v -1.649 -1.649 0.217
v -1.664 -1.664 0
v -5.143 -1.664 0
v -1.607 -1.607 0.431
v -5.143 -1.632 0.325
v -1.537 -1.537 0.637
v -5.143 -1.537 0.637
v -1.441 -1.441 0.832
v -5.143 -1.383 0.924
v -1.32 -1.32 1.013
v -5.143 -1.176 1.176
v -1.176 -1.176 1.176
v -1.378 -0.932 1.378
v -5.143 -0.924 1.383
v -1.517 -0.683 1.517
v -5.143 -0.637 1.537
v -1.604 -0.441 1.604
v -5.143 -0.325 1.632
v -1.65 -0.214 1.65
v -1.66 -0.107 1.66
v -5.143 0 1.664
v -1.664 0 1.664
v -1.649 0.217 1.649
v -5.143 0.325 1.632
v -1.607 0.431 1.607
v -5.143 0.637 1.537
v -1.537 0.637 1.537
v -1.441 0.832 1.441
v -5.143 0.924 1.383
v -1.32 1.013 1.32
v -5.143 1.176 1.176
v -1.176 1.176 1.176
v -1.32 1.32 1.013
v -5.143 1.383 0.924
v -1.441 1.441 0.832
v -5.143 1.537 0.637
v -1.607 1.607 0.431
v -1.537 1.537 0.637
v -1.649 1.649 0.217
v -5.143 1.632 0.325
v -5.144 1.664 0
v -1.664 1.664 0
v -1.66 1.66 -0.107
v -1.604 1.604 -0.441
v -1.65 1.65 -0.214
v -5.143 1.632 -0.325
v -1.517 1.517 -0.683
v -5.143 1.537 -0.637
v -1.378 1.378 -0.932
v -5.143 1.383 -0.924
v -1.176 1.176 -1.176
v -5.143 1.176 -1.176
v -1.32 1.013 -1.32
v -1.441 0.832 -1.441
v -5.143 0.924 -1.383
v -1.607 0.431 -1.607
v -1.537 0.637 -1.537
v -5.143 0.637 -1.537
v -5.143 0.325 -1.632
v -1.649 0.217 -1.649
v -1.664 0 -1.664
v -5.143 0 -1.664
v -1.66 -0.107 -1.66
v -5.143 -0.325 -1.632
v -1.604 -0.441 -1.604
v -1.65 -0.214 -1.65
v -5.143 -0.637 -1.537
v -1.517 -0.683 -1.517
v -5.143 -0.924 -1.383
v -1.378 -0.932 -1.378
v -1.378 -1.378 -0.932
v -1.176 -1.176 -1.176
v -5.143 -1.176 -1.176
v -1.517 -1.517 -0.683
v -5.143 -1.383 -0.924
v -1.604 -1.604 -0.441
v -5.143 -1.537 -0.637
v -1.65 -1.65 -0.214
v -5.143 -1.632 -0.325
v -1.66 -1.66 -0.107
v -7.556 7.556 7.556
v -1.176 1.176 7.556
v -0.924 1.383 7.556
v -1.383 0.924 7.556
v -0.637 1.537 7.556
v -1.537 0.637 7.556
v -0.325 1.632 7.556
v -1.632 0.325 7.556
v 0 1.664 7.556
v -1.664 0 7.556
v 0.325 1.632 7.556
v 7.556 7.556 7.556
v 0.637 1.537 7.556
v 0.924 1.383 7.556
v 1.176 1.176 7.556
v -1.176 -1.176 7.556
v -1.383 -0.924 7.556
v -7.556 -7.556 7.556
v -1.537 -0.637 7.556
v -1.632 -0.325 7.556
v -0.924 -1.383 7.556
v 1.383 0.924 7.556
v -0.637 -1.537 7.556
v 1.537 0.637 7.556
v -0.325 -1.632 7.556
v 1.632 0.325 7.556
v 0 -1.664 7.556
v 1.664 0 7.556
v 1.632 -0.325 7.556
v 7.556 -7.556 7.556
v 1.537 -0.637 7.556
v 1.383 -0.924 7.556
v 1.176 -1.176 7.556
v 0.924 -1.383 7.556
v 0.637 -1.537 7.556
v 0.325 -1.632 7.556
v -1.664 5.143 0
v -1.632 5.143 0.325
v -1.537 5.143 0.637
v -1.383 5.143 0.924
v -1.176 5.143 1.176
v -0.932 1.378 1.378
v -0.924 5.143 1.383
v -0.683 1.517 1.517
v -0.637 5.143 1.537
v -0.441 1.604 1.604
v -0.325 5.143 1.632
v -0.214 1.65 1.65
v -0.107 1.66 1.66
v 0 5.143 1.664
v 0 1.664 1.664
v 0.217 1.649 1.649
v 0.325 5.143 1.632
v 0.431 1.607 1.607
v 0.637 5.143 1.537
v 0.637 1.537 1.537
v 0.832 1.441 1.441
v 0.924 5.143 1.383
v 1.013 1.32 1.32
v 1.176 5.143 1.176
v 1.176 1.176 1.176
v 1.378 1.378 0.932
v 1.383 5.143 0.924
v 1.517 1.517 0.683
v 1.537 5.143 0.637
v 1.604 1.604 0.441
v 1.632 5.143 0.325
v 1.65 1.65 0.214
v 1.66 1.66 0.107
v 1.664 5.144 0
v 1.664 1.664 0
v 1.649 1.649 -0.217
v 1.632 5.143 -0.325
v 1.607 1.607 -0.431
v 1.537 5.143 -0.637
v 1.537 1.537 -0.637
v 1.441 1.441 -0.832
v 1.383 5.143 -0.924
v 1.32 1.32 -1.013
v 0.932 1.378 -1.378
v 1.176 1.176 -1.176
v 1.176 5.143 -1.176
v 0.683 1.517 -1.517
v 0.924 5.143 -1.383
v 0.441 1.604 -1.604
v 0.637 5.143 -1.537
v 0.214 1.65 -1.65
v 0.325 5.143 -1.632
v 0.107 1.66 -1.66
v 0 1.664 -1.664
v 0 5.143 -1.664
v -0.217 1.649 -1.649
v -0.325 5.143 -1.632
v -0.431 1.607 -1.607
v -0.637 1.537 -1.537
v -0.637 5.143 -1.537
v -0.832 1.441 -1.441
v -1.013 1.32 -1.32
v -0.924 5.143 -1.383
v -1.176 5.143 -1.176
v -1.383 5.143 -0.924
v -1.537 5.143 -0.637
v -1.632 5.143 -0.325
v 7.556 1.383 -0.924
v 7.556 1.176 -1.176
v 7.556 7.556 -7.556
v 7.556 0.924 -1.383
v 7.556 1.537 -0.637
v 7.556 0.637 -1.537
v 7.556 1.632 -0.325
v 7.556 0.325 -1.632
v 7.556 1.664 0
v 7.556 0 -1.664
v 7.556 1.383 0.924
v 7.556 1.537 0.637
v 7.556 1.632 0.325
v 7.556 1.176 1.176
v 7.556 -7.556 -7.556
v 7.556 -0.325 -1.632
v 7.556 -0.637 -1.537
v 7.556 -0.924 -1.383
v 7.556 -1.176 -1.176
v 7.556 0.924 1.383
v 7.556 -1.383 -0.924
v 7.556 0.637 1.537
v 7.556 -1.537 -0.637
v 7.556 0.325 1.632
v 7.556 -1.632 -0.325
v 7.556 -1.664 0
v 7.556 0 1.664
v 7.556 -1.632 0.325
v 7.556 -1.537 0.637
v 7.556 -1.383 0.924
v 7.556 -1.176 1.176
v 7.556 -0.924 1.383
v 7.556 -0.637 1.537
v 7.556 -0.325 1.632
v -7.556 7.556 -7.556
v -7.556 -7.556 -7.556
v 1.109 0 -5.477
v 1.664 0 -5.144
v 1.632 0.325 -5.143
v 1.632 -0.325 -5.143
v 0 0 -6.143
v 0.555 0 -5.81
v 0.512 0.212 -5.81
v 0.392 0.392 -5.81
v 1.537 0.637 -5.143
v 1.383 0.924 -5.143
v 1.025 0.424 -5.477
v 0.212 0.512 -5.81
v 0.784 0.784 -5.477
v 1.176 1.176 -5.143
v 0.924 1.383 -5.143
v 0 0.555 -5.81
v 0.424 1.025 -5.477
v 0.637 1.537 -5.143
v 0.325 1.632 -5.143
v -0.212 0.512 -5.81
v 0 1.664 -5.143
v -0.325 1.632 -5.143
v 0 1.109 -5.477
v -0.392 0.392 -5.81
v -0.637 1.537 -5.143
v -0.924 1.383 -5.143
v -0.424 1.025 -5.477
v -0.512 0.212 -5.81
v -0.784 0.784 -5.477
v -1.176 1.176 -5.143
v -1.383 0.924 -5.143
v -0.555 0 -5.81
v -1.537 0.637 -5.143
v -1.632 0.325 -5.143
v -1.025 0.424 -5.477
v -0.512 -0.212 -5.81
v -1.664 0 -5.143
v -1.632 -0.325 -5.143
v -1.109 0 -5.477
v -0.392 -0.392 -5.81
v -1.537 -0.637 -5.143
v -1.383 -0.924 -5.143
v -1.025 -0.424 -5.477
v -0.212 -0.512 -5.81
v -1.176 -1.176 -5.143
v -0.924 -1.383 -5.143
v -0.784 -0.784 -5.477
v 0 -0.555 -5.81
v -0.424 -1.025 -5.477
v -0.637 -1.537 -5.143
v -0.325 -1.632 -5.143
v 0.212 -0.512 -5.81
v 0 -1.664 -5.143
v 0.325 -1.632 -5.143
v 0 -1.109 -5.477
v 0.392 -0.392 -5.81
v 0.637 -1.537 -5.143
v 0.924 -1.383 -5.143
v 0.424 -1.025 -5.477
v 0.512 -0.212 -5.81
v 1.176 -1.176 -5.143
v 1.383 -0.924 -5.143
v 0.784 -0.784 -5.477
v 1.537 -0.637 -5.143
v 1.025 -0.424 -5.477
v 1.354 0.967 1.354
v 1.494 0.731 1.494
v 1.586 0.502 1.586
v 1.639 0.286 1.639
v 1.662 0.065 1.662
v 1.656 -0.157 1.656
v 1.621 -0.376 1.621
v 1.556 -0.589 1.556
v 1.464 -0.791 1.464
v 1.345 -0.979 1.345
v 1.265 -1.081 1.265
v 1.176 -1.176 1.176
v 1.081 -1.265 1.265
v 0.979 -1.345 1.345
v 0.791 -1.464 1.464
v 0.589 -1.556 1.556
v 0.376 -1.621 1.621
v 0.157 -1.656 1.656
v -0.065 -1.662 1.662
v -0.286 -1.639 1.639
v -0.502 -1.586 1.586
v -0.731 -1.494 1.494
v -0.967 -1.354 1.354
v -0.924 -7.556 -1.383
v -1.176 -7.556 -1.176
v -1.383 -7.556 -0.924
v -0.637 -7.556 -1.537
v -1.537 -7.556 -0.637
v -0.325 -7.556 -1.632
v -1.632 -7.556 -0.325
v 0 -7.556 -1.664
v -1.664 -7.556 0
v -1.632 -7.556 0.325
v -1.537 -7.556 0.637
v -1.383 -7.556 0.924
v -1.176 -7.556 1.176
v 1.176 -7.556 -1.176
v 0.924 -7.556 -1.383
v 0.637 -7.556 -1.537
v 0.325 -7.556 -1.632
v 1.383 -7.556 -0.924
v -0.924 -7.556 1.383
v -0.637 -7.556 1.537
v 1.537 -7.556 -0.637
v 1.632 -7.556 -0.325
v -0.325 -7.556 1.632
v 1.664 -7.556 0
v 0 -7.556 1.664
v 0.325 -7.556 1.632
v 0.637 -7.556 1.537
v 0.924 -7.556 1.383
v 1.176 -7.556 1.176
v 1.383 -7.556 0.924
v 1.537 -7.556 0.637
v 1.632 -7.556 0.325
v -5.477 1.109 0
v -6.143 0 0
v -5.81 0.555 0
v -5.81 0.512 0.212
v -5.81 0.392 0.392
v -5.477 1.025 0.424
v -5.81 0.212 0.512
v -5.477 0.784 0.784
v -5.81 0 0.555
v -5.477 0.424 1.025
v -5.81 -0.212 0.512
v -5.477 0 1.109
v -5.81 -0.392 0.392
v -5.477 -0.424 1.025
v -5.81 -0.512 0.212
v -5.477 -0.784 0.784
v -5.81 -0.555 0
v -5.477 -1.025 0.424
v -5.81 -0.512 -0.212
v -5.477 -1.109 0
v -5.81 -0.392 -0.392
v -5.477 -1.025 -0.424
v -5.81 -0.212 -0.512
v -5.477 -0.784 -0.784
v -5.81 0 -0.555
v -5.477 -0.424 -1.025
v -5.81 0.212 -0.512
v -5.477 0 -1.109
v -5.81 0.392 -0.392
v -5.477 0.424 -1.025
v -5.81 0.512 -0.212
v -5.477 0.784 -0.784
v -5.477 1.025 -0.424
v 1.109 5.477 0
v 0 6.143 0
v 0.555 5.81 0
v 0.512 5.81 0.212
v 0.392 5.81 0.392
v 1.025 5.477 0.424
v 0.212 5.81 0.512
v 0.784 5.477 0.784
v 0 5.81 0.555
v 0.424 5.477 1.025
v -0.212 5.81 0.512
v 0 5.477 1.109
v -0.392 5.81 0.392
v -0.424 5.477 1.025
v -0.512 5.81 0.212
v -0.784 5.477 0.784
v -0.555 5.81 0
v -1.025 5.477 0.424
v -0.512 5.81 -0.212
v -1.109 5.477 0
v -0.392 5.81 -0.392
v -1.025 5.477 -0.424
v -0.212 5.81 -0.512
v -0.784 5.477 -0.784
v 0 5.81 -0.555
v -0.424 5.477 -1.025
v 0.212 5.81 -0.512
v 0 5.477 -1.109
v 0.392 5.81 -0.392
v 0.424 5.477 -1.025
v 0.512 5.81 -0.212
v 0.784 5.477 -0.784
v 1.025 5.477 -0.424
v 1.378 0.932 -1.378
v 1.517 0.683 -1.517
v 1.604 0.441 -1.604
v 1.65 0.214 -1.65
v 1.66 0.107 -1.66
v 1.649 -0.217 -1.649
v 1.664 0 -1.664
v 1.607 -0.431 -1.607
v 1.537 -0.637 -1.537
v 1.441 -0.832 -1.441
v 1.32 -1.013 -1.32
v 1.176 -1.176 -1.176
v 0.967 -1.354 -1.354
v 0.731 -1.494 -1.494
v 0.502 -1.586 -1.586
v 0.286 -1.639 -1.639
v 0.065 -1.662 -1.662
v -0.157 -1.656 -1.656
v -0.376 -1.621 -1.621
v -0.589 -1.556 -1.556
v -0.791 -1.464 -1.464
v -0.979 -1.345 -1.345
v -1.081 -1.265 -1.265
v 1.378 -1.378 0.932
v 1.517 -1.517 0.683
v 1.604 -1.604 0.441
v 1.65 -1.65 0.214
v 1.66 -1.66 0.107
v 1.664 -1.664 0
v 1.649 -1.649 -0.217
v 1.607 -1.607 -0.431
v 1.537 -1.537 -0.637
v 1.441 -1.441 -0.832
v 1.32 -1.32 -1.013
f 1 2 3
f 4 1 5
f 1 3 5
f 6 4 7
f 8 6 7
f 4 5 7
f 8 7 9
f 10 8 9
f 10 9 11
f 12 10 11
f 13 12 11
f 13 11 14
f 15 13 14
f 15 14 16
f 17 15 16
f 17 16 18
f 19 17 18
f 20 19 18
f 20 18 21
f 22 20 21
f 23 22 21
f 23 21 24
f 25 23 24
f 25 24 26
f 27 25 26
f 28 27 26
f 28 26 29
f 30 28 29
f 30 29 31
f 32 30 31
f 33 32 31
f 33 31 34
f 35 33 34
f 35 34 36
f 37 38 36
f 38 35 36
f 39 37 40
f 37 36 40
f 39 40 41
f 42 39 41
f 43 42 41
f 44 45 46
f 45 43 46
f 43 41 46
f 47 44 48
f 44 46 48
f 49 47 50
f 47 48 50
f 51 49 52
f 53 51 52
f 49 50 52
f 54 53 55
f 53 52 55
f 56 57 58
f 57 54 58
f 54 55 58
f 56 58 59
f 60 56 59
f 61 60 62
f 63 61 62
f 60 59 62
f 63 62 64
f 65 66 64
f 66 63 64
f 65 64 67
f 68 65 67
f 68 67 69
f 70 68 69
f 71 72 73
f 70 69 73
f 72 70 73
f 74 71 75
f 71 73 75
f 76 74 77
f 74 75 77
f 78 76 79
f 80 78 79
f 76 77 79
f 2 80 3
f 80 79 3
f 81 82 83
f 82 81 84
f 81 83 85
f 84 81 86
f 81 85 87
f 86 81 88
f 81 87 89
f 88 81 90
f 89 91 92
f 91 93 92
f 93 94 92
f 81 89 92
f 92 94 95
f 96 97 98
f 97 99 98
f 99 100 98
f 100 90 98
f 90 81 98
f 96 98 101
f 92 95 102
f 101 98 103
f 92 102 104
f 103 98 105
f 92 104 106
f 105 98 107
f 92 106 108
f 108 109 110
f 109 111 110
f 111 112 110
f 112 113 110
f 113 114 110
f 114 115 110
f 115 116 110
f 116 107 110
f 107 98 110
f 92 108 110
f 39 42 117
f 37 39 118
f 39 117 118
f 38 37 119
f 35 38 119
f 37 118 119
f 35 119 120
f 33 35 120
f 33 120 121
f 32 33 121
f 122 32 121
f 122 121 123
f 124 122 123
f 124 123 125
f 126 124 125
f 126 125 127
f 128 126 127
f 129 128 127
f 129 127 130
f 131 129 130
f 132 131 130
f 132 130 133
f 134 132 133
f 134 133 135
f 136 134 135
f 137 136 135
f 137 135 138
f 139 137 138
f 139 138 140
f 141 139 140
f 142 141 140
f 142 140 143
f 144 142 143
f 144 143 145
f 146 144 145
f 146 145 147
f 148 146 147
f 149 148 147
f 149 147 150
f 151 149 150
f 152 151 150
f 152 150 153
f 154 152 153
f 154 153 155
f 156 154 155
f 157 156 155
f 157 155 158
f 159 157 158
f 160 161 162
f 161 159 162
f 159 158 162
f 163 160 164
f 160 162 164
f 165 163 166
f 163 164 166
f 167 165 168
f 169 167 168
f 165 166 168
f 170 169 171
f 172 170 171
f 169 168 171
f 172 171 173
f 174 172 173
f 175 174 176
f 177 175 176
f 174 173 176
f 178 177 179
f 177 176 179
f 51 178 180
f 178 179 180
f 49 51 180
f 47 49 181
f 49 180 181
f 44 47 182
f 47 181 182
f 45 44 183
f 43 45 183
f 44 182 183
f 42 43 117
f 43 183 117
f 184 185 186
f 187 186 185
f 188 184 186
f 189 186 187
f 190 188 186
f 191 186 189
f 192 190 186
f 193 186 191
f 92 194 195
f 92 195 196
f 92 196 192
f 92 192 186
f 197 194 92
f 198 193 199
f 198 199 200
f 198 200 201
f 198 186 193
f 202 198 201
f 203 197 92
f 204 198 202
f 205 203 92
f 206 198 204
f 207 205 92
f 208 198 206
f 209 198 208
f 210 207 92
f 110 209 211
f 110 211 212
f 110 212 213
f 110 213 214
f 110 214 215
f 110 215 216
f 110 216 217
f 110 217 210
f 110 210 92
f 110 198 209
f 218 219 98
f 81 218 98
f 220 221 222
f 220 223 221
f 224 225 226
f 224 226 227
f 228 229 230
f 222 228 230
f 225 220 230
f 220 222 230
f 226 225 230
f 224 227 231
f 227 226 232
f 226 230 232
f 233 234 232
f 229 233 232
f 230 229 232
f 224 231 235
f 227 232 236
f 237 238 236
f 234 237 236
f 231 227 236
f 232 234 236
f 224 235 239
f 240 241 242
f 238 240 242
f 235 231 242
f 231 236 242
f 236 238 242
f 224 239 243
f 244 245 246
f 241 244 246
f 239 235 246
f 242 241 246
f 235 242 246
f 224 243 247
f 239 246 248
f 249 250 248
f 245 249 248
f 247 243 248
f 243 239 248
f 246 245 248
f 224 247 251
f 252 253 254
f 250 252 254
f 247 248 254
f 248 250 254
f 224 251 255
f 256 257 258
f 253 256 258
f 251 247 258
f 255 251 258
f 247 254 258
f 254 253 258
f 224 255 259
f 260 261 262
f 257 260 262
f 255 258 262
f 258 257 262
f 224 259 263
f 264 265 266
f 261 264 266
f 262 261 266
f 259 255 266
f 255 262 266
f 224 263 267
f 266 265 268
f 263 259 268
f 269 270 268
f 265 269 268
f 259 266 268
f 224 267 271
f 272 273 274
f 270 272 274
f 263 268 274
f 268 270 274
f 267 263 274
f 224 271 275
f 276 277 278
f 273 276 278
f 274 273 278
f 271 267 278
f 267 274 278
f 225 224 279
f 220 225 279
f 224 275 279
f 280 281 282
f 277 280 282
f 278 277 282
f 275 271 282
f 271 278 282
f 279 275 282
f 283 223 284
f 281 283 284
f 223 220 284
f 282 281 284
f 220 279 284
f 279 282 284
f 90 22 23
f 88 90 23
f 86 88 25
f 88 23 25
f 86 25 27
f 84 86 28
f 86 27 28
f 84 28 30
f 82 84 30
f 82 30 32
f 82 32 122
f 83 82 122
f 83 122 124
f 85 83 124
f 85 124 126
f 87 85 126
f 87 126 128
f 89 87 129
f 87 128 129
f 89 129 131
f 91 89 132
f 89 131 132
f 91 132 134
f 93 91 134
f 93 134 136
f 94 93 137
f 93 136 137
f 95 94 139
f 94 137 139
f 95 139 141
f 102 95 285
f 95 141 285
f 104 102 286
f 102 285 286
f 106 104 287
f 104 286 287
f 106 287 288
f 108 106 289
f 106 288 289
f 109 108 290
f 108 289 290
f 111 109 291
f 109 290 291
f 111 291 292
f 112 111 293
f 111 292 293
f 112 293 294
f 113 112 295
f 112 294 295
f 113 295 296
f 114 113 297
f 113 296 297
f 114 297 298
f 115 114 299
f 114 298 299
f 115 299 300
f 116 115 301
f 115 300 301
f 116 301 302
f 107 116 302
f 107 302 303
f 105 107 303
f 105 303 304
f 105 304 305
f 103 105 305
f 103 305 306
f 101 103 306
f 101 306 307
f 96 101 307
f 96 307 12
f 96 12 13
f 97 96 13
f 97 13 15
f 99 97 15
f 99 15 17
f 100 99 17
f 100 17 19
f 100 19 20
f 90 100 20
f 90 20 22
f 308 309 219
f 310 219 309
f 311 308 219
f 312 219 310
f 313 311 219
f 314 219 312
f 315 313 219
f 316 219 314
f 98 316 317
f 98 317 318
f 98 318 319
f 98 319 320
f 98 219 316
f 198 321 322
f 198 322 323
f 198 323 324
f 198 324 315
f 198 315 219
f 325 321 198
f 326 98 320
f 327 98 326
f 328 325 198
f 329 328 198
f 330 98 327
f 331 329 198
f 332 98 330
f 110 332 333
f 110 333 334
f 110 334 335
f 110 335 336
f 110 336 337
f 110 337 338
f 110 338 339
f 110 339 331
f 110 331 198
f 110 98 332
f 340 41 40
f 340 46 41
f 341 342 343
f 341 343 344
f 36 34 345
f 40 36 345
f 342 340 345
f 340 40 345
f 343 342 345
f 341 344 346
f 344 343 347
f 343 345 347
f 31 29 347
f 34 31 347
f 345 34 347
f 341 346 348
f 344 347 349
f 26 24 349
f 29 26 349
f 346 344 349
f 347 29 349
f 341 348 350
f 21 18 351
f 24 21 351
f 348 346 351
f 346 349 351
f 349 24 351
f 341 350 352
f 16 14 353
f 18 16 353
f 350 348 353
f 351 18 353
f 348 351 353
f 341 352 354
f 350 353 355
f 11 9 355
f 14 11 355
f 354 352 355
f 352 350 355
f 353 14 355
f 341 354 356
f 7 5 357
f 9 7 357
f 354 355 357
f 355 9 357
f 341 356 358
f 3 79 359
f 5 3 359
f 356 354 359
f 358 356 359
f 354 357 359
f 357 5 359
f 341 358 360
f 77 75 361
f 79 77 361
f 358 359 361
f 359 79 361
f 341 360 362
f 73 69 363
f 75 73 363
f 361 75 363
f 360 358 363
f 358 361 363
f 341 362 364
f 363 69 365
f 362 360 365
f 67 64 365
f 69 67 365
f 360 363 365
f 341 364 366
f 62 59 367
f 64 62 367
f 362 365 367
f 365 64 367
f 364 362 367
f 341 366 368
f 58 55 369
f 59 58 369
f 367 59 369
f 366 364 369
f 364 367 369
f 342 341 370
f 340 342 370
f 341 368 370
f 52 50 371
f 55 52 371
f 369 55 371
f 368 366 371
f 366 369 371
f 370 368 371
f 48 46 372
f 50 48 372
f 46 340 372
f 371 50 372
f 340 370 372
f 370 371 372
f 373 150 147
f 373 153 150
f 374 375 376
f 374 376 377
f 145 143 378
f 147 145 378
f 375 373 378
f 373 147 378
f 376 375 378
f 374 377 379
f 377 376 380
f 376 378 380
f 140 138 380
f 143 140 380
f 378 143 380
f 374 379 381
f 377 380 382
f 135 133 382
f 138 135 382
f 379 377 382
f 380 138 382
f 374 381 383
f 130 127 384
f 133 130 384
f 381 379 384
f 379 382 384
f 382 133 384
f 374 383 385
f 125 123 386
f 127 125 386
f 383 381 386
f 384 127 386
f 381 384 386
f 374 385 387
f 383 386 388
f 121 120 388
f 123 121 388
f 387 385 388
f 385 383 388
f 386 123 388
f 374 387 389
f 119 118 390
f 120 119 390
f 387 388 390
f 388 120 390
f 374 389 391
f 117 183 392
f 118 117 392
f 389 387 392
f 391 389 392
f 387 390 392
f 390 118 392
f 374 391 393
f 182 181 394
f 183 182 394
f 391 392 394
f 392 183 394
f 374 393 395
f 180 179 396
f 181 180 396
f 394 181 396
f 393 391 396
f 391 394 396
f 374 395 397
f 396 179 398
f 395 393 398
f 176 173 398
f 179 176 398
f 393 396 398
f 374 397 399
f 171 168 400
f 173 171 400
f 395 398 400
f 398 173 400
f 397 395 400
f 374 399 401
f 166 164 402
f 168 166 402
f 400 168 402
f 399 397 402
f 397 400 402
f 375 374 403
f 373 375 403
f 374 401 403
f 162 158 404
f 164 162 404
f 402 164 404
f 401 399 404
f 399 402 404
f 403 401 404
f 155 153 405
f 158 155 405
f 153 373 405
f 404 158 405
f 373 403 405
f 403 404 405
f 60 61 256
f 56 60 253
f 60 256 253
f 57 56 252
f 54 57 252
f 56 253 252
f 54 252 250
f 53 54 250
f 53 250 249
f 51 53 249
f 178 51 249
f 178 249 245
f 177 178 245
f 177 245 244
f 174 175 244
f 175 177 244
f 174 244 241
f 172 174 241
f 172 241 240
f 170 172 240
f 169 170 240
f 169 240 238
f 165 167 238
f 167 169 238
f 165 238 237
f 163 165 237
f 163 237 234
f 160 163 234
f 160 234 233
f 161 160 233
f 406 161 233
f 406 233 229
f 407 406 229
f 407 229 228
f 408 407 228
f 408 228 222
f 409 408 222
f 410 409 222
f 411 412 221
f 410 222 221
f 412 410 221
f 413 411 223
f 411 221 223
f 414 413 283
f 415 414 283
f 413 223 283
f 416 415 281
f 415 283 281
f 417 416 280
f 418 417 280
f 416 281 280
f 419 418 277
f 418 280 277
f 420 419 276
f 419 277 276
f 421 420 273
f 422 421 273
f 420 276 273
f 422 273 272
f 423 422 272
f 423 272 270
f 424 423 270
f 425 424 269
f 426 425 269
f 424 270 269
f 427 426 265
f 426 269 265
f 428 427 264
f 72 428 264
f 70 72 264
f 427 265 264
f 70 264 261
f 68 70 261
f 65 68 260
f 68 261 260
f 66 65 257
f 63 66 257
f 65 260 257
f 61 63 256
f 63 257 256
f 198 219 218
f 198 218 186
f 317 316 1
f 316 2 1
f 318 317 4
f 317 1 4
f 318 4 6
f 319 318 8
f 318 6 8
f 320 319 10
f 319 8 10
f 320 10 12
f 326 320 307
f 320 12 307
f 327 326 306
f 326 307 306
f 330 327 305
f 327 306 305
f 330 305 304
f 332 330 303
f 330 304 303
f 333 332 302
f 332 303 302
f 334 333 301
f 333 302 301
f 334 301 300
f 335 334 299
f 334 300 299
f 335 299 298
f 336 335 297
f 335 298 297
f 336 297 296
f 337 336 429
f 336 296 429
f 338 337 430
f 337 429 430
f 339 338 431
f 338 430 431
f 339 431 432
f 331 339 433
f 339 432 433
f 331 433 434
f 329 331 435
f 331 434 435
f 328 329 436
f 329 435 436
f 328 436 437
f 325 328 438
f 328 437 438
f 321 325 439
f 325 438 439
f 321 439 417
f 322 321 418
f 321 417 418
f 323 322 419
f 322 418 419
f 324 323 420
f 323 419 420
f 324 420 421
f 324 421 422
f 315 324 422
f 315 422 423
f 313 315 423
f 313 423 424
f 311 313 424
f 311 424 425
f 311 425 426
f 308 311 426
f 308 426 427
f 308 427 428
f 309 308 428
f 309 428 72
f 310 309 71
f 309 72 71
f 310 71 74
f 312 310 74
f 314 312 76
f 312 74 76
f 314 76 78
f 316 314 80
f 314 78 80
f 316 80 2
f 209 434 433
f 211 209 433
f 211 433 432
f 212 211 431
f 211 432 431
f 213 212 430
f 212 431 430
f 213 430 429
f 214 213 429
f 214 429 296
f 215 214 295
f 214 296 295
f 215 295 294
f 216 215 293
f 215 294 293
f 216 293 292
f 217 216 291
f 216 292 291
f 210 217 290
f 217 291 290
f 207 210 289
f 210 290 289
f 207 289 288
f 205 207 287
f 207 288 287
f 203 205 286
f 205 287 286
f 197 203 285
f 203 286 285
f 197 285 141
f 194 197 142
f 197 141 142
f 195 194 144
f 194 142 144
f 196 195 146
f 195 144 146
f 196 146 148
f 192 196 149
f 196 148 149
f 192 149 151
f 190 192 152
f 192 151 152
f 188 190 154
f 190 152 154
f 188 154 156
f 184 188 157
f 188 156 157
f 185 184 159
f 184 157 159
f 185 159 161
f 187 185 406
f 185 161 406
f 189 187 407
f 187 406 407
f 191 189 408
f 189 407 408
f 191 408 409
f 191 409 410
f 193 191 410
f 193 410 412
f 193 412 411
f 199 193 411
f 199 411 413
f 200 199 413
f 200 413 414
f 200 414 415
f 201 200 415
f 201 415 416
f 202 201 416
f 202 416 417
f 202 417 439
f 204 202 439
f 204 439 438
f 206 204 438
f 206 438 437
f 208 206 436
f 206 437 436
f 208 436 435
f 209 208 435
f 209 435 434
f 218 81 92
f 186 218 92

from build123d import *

# Parameters (mm, degrees)
F0_W     = 15.113
F0_H     = 15.113
F1_DEPTH = 7.5565
F3_D     = 3.3274
F3_DEPTH = 12.7
F3_TIP   = 0.9996518119
F5_D     = 3.3274
F5_DEPTH = 12.7
F5_TIP   = 0.9996518119
F7_D     = 3.3274
F7_DEPTH = 12.7
F7_TIP   = 0.9996518119


with BuildPart() as f1:
    # F0 (on Front) → F1 (new body, symmetric)
    with BuildSketch(Plane.XZ):
        Rectangle(F0_W, F0_H)
    extrude(amount=F1_DEPTH, both=True)

    # F3
    with Locations(Plane.XZ.offset(7.5565)):
        with Locations((0, 0)):
            Hole(F3_D / 2, depth=F3_DEPTH)
            with Locations((0, 0, -(F3_DEPTH + F3_TIP / 2))):  # 118° drill point
                Cone(0, F3_D / 2, F3_TIP, mode=Mode.SUBTRACT)

    # F5
    with Locations(Plane.XY.offset(7.5565)):
        with Locations((0, 0)):
            Hole(F5_D / 2, depth=F5_DEPTH)
            with Locations((0, 0, -(F5_DEPTH + F5_TIP / 2))):  # 118° drill point
                Cone(0, F5_D / 2, F5_TIP, mode=Mode.SUBTRACT)

    # F7
    with Locations(Plane.YZ.offset(7.5565)):
        with Locations((0, 0)):
            Hole(F7_D / 2, depth=F7_DEPTH)
            with Locations((0, 0, -(F7_DEPTH + F7_TIP / 2))):  # 118° drill point
                Cone(0, F7_D / 2, F7_TIP, mode=Mode.SUBTRACT)


solid = f1.part
